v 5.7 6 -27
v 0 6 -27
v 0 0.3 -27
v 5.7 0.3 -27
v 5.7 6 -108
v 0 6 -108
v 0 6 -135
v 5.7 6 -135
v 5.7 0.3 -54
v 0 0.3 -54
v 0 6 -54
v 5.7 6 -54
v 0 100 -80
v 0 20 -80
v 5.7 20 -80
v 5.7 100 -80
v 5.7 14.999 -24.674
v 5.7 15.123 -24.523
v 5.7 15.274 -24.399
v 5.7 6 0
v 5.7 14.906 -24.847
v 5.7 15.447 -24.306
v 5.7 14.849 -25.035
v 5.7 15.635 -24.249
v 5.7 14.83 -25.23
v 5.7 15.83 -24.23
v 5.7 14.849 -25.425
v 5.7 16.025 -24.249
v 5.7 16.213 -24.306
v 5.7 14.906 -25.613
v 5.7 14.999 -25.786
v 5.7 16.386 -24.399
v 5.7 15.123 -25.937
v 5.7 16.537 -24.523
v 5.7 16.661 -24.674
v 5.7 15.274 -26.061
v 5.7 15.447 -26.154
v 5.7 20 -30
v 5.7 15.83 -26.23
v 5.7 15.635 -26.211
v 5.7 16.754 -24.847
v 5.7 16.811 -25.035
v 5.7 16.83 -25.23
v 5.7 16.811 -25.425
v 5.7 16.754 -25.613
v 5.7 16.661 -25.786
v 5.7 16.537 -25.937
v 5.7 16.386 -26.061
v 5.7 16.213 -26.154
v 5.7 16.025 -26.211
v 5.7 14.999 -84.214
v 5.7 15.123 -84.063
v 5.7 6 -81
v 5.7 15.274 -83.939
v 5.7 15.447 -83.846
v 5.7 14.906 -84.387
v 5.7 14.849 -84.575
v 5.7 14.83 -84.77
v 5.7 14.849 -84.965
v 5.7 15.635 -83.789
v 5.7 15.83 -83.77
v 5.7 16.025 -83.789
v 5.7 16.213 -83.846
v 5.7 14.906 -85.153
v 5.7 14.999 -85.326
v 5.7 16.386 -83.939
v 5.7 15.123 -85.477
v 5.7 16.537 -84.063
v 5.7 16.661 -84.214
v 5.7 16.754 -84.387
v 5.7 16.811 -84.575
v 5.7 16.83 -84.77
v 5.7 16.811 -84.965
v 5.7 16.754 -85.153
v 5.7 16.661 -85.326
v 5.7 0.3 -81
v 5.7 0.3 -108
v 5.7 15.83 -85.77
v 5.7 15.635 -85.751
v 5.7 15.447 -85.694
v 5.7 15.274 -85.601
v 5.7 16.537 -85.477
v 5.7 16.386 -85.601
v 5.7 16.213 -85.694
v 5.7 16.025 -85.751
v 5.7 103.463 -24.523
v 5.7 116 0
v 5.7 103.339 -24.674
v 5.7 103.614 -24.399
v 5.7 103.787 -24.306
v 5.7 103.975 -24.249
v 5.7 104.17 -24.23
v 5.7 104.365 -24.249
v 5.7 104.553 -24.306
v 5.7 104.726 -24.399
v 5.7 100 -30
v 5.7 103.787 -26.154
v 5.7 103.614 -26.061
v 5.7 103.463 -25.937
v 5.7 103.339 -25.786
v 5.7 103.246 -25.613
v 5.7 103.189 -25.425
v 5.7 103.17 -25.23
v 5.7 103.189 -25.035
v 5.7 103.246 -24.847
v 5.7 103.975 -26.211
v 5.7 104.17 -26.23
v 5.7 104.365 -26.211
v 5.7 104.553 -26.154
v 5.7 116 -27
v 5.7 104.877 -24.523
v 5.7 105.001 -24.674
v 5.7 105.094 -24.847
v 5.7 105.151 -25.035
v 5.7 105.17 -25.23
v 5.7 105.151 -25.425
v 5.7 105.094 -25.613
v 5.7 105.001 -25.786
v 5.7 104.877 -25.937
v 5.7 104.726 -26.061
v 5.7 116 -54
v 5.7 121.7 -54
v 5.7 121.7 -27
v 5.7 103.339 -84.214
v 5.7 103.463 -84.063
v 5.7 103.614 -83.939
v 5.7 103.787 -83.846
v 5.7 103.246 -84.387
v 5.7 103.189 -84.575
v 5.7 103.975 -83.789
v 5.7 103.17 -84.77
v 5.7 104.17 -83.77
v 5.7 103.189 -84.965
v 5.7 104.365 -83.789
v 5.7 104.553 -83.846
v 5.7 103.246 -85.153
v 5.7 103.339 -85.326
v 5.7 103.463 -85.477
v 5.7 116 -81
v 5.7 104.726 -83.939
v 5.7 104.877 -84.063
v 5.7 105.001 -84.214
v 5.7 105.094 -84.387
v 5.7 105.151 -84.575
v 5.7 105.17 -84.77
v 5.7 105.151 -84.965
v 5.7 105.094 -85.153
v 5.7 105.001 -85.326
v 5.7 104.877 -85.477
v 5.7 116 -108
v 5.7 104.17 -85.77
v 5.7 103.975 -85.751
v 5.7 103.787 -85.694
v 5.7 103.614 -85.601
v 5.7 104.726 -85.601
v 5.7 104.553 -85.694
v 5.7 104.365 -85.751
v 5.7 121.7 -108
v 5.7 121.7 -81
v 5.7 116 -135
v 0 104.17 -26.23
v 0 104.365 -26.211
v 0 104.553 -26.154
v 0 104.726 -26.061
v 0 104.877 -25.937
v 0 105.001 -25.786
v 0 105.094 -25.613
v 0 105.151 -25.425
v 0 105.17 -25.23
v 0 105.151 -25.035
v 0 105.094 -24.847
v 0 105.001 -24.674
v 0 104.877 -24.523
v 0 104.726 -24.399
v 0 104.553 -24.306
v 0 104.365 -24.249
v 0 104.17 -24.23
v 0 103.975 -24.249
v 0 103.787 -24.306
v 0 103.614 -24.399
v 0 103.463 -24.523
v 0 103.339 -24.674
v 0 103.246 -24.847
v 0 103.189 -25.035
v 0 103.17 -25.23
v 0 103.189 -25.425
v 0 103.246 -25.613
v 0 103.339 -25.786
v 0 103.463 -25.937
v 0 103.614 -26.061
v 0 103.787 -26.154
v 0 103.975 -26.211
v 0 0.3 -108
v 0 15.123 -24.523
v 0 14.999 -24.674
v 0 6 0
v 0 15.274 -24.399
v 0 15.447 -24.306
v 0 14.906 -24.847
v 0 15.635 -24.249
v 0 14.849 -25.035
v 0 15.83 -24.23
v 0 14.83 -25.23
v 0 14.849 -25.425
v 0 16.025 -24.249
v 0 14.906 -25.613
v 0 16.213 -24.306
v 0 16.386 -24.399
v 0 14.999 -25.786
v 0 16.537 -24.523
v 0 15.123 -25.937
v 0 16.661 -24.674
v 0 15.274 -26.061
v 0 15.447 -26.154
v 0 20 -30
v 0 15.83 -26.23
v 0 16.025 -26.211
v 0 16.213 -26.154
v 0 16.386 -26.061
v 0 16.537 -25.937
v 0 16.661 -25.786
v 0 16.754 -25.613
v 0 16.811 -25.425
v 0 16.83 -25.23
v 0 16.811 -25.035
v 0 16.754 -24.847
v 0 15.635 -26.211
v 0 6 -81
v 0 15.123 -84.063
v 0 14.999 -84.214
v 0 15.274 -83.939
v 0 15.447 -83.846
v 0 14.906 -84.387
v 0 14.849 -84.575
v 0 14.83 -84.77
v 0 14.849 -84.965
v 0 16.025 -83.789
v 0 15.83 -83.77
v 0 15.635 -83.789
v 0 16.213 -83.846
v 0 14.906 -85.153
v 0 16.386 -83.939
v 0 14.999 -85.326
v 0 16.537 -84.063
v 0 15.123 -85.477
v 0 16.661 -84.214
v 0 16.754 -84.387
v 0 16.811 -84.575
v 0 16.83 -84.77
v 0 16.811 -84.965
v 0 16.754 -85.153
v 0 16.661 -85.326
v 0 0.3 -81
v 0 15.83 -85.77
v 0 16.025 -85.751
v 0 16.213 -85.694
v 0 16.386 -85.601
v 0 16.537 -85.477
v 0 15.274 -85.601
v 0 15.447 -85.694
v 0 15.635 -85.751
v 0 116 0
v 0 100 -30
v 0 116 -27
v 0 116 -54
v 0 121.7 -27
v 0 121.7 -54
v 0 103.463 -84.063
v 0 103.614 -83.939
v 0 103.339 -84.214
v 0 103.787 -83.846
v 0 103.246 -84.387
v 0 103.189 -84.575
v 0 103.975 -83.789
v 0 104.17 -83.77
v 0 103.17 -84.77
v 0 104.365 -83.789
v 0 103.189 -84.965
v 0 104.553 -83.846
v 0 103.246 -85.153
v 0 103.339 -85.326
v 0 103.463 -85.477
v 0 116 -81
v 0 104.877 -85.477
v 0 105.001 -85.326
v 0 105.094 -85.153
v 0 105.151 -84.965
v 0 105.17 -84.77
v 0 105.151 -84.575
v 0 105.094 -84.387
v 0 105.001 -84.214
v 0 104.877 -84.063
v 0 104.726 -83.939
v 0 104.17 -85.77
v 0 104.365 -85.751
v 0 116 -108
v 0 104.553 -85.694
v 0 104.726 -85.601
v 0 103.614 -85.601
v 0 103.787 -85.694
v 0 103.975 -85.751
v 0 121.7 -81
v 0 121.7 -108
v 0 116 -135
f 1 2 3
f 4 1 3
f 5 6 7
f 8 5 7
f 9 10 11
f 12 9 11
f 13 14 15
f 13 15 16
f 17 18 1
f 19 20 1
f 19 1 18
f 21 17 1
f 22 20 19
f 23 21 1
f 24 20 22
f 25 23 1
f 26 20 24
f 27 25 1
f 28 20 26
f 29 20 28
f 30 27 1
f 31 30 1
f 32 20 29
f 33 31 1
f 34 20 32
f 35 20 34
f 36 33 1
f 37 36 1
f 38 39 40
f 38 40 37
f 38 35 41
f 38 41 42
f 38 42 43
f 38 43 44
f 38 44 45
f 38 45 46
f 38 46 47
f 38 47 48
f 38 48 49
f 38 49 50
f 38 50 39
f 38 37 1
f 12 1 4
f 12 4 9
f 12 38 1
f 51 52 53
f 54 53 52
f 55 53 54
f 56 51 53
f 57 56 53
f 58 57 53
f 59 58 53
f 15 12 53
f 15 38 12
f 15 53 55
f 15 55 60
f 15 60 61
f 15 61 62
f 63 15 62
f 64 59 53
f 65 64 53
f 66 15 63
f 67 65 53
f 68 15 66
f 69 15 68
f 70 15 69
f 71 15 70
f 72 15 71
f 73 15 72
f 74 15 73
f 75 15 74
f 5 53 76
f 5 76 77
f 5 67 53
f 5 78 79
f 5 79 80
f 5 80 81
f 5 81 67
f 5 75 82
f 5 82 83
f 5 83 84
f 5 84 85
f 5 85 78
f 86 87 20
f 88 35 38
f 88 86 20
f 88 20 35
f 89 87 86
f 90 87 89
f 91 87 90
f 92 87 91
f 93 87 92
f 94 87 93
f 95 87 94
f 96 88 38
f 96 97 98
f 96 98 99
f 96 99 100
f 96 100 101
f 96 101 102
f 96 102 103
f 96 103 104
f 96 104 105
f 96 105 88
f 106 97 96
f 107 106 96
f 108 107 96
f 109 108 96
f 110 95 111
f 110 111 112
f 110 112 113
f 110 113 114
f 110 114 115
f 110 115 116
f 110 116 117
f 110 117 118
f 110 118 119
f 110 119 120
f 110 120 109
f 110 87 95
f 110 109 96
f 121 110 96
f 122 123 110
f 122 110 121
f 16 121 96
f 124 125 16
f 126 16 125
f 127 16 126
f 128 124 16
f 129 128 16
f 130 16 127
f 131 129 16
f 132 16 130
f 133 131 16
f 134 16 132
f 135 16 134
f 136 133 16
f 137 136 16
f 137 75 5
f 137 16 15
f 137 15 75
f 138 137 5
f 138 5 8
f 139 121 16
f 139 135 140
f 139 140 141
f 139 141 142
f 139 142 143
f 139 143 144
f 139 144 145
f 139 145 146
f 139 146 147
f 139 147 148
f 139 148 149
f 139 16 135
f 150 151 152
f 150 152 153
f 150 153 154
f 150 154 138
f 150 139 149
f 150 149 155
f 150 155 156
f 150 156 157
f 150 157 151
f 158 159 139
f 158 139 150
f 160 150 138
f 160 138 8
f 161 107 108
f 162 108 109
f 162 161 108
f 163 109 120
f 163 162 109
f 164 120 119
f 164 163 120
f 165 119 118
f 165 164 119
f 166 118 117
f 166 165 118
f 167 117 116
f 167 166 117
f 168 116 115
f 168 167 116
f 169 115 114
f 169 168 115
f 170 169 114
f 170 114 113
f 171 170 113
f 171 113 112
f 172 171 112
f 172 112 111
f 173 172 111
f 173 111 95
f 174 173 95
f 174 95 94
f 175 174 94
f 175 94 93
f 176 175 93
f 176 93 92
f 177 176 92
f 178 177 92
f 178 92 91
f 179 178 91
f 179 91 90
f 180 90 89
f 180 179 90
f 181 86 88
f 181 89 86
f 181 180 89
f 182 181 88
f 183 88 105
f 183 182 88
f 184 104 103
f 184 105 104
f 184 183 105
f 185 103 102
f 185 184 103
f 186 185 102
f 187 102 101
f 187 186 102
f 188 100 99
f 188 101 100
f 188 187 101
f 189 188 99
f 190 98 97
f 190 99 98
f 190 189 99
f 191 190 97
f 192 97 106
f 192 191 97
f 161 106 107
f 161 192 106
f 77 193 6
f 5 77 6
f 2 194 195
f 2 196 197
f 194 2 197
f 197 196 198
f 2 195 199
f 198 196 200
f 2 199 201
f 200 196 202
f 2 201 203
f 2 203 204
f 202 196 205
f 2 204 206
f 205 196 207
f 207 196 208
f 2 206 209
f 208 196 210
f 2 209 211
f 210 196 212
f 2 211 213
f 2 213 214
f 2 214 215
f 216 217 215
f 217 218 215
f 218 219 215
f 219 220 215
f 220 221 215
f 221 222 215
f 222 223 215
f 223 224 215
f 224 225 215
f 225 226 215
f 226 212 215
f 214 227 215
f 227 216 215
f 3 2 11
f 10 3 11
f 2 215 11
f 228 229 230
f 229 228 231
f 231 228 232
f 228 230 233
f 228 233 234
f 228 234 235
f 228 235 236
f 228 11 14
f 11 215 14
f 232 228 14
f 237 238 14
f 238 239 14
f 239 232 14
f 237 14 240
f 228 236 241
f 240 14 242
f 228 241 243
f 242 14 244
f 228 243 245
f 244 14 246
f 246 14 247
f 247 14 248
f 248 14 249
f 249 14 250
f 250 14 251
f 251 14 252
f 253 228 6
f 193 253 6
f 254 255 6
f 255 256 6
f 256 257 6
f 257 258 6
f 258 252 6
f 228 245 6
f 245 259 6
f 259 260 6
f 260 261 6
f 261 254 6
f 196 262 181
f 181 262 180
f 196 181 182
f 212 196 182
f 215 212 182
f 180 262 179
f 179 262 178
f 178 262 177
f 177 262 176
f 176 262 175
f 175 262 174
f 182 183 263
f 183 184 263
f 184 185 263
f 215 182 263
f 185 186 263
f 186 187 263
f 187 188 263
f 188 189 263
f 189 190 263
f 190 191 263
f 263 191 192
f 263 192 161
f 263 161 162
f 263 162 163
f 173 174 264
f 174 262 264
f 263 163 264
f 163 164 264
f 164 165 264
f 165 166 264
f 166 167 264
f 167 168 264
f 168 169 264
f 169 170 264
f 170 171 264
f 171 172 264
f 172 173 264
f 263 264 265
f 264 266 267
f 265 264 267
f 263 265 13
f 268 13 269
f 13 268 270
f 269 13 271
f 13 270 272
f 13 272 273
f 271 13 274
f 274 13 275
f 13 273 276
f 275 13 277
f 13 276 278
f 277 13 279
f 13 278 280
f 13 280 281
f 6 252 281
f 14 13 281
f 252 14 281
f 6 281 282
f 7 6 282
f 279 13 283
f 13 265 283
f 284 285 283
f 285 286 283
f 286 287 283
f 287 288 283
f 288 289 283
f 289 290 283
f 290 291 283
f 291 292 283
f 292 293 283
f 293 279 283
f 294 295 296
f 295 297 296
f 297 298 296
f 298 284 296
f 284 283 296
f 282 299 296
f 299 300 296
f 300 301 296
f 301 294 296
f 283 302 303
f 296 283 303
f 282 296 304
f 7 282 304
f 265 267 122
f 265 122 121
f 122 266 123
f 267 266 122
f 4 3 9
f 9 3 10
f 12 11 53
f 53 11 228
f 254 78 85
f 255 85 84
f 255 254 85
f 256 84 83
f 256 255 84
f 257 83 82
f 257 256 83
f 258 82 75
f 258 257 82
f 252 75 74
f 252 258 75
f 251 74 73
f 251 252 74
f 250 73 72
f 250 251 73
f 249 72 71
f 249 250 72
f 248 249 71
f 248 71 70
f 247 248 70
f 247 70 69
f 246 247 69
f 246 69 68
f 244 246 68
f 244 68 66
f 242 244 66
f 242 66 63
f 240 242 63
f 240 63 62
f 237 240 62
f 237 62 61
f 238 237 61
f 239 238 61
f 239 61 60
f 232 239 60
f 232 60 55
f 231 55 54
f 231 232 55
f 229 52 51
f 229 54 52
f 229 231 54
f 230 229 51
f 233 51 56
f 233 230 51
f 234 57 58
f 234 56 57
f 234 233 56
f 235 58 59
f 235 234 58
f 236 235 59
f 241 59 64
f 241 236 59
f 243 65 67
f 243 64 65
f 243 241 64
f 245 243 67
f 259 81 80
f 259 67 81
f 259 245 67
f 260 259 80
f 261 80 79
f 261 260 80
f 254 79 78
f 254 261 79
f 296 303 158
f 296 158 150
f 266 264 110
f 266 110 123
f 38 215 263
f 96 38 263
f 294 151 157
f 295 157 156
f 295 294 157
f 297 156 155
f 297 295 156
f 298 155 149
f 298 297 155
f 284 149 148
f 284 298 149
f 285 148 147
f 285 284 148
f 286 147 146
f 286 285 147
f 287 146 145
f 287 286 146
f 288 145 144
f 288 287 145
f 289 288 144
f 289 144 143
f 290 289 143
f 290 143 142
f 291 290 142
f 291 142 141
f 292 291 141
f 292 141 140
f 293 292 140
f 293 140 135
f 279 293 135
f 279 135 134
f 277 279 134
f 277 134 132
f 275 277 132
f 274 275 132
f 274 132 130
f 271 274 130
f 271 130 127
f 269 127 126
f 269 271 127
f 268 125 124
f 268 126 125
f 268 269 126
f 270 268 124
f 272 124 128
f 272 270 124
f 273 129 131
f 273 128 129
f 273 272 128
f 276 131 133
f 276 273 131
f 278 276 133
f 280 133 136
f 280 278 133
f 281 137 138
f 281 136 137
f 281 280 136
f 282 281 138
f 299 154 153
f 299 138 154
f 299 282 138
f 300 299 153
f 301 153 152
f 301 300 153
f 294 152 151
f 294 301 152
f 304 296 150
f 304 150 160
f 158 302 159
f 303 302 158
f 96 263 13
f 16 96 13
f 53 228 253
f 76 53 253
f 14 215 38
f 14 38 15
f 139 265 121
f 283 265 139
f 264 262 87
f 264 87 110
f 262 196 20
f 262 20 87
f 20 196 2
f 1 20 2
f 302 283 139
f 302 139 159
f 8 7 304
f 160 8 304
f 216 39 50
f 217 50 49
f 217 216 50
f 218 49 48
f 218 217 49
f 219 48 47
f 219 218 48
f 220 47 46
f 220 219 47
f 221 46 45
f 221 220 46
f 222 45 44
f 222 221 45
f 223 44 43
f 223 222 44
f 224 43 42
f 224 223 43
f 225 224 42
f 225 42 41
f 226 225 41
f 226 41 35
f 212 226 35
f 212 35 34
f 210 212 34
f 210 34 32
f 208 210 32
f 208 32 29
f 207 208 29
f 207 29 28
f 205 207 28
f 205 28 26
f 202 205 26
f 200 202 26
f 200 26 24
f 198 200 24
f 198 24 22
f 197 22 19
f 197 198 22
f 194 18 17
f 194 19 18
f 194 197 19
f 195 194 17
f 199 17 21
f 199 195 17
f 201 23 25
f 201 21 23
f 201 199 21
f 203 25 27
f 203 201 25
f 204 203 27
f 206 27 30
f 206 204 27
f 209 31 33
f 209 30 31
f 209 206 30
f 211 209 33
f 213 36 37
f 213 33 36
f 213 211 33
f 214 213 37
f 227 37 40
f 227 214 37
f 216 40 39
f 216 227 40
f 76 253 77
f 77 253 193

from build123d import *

# Parameters (mm, degrees)
SKETCH1_W           = 135
SKETCH1_H           = 122
BOSS_EXTRUDE1_DEPTH = 5.7
CUT_EXTRUDE1_DEPTH  = 6
HOLE_W              = 50
HOLE_H              = 80
CUT_EXTRUDE2_DEPTH  = 70
SCREW_LOCATIONS_R   = 1
CUT_EXTRUDE3_DEPTH  = 52


with BuildPart() as part:
    # Sketch1 → Boss-Extrude1 (new body)
    with BuildSketch(Plane(origin=(0, 0, 0), x_dir=(0, 0, -1), z_dir=(1, 0, 0))):
        with Locations((67.5, 61)):
            Rectangle(SKETCH1_W, SKETCH1_H)
    extrude(amount=BOSS_EXTRUDE1_DEPTH)

    # Sketch2 → Cut-Extrude1 (cut)
    with BuildSketch(Plane(origin=(0, 0, 0), x_dir=(0, 0, -1), z_dir=(1, 0, 0))):
        Polygon((0, 116), (27, 116), (27, 121.7), (54, 121.7), (54, 116), (81, 116), (81, 121.7), (108, 121.7), (108, 116), (135, 116), (135, 130), (0, 130), align=None)
        Polygon((0, -8), (0, 6), (27, 6), (27, 0.3), (54, 0.3), (54, 6), (81, 6), (81, 0.3), (108, 0.3), (108, 6), (135, 6), (135, -8), align=None)
    extrude(amount=CUT_EXTRUDE1_DEPTH, mode=Mode.SUBTRACT)

    # Hole → Cut-Extrude2 (cut)
    with BuildSketch(Plane(origin=(0, 0, 0), x_dir=(0, 0, -1), z_dir=(1, 0, 0))):
        with Locations((55, 60)):
            Rectangle(HOLE_W, HOLE_H)
    extrude(amount=CUT_EXTRUDE2_DEPTH, mode=Mode.SUBTRACT)

    # Screw Locations → Cut-Extrude3 (cut)
    with BuildSketch(Plane(origin=(0, 0, 0), x_dir=(0, 0, -1), z_dir=(1, 0, 0))):
        with Locations((25.23, 104.17)):
            Circle(SCREW_LOCATIONS_R)
        with Locations((84.77, 104.17)):
            Circle(SCREW_LOCATIONS_R)
        with Locations((25.23, 15.83)):
            Circle(SCREW_LOCATIONS_R)
        with Locations((84.77, 15.83)):
            Circle(SCREW_LOCATIONS_R)
    extrude(amount=CUT_EXTRUDE3_DEPTH, mode=Mode.SUBTRACT)


solid = part.part
